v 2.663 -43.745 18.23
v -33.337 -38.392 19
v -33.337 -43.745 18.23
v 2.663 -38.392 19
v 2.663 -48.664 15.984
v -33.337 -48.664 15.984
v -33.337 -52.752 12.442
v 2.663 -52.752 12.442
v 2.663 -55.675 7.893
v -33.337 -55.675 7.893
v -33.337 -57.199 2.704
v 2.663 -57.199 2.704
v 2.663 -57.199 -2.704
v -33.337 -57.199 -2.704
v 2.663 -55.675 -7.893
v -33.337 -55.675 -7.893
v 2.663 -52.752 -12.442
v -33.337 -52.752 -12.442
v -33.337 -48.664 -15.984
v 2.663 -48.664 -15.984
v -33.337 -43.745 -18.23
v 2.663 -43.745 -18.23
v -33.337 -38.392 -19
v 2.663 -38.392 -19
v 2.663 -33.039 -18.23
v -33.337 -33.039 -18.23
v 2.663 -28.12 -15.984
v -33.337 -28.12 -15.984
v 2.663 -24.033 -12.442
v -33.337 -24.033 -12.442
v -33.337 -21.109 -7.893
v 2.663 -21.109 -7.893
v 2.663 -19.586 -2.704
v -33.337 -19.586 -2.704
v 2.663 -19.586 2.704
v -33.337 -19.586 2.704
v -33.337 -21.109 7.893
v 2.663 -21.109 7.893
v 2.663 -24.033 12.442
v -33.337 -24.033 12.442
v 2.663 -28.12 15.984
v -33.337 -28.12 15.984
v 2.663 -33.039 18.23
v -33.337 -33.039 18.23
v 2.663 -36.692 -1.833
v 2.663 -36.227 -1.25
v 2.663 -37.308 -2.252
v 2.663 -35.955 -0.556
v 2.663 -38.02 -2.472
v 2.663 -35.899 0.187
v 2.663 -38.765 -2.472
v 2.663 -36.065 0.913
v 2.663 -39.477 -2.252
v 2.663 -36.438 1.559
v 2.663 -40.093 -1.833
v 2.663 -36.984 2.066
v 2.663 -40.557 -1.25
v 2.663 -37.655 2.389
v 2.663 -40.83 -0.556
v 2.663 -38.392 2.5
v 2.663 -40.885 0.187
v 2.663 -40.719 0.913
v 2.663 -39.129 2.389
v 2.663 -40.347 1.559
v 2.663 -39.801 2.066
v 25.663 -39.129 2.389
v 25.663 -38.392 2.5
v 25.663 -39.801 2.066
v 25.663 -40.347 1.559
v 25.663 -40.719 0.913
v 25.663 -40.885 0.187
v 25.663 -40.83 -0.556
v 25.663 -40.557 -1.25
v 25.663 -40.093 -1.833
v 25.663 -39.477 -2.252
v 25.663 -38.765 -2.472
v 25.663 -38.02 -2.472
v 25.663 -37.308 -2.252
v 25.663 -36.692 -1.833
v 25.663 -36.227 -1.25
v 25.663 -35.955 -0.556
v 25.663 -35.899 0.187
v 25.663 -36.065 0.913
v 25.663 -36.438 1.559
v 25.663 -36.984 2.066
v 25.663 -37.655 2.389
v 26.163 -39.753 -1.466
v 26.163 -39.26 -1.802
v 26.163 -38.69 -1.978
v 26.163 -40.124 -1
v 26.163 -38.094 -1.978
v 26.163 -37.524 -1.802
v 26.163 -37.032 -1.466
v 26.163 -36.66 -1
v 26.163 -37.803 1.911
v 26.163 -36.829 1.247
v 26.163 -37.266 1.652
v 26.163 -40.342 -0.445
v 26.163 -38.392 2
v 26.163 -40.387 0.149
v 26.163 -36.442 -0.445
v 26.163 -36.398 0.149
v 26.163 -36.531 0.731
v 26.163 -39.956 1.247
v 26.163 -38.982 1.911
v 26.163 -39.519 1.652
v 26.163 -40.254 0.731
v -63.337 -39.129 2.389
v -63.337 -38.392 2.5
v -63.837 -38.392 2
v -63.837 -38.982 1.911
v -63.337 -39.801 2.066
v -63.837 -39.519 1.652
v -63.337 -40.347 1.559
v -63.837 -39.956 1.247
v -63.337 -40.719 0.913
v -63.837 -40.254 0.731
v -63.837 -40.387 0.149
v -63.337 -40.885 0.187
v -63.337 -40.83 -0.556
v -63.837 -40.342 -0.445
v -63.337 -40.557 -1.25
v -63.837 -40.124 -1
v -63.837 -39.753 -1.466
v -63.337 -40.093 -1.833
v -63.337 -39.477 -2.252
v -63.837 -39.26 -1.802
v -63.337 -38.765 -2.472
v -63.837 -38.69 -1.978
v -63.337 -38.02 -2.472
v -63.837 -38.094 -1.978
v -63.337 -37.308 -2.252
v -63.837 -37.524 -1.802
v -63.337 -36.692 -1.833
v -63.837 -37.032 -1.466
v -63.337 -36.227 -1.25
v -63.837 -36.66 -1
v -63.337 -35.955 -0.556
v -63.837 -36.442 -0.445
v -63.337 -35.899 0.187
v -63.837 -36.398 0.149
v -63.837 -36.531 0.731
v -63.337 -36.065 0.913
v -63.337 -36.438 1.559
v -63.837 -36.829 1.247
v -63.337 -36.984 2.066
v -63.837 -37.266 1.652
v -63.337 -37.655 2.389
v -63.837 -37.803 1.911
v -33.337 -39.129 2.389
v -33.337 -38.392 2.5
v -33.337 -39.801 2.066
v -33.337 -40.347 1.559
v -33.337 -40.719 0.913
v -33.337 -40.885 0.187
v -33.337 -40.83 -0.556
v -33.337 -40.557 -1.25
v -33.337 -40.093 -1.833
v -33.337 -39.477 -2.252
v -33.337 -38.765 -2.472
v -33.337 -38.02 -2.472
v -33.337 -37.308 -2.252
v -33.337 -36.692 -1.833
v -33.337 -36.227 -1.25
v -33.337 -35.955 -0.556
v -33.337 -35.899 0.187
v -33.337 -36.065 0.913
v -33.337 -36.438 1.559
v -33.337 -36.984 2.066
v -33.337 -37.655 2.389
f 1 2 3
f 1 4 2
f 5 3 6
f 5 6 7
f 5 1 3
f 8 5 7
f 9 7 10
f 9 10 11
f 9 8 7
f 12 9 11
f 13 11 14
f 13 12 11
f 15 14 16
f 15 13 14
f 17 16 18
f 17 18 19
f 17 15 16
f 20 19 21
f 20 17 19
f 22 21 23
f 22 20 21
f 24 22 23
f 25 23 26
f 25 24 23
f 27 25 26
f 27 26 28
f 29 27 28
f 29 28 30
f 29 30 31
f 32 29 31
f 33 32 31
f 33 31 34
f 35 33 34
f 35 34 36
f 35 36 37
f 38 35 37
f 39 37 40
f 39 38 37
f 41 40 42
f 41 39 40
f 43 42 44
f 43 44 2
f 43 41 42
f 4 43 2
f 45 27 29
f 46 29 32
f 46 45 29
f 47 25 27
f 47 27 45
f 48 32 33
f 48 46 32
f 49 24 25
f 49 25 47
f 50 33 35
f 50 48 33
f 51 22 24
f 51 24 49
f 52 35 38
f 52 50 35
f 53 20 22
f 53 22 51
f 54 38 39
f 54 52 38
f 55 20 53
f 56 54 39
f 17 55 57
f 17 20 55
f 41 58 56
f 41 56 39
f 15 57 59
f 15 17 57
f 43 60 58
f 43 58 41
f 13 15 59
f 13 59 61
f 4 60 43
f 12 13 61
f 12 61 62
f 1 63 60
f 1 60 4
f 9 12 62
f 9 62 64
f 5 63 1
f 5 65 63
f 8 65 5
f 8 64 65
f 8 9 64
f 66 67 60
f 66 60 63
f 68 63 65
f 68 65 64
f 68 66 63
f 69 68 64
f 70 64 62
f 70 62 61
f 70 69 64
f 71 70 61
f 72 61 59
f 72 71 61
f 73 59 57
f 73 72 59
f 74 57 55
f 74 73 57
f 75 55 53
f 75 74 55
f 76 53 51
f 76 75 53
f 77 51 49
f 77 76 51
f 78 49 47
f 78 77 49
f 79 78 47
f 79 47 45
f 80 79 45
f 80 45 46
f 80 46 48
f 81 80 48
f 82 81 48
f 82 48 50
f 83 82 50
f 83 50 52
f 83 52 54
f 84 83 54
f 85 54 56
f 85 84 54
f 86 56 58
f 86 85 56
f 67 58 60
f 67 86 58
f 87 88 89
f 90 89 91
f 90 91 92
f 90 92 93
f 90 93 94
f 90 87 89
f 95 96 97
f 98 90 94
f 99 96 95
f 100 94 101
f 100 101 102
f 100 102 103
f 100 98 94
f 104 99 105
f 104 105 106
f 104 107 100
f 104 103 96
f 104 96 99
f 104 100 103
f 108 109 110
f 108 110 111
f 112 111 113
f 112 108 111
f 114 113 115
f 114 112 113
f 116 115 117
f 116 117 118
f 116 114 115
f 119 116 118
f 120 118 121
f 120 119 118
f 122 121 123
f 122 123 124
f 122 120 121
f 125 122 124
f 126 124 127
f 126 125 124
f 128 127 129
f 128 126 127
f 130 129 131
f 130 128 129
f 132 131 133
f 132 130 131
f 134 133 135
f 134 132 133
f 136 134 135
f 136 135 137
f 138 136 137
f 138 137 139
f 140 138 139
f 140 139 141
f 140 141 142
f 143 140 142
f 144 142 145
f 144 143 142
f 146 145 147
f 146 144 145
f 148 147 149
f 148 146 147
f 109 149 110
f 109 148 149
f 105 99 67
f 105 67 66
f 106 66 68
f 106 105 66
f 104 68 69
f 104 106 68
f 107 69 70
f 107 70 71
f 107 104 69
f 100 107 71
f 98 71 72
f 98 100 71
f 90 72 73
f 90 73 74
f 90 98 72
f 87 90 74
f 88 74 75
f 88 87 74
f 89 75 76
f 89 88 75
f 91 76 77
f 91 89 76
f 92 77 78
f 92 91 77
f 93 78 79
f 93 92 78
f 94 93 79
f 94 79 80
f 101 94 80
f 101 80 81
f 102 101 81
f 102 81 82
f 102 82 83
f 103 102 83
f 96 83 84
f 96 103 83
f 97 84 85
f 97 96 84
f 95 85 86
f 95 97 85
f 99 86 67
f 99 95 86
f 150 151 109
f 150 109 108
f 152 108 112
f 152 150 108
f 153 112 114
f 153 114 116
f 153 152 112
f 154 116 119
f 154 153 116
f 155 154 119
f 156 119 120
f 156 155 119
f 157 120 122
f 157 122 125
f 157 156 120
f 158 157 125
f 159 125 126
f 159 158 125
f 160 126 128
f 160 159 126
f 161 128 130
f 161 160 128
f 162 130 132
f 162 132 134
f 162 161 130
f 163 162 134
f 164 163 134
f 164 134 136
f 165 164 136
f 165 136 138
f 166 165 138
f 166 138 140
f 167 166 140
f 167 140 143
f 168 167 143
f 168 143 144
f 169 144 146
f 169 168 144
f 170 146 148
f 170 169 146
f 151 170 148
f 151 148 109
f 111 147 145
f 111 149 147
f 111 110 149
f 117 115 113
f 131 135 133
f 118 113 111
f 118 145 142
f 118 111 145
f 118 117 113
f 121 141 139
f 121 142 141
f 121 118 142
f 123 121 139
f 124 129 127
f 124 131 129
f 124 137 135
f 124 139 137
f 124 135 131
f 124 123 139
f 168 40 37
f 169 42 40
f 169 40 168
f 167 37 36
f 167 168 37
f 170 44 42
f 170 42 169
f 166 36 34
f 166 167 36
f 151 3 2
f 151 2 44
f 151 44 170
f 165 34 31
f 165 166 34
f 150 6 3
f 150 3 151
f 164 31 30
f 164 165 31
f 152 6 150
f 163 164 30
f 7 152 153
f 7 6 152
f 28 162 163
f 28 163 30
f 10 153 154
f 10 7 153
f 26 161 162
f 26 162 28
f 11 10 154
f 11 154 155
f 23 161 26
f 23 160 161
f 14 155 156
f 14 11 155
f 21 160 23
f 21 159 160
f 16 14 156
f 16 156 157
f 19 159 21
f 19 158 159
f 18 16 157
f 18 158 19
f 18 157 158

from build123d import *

# Parameters (mm, degrees)
CHANFREIN1_SIZE = 0.5


with BuildPart() as part:
    # Esquisse1 → Révolution1 (revolve)
    with BuildSketch(Plane.XY, mode=Mode.PRIVATE) as r_volution1_sk:
        Polygon((-33.336541, -19.392259), (2.663459, -19.392259), (2.663459, -35.892259), (26.163459, -35.892259), (26.163459, -38.392259), (-63.836541, -38.392259), (-63.836541, -35.892259), (-33.336541, -35.892259), align=None)
    revolve(r_volution1_sk.sketch.rotate(Axis((-107.151340206, -38.392259, 0), (1, 0, 0)), 90), axis=Axis((-107.151340206, -38.392259, 0), (1, 0, 0)))  # turned: the seam where the file's is

    # Chanfrein1
    chanfrein1_edges = [part.edges().sort_by_distance(p)[0] for p in [
        (26.163459, -38.392259, -2.5),
        (-63.836541, -38.392259, -2.5),
    ]]
    chamfer(chanfrein1_edges, length=CHANFREIN1_SIZE)


solid = part.part
